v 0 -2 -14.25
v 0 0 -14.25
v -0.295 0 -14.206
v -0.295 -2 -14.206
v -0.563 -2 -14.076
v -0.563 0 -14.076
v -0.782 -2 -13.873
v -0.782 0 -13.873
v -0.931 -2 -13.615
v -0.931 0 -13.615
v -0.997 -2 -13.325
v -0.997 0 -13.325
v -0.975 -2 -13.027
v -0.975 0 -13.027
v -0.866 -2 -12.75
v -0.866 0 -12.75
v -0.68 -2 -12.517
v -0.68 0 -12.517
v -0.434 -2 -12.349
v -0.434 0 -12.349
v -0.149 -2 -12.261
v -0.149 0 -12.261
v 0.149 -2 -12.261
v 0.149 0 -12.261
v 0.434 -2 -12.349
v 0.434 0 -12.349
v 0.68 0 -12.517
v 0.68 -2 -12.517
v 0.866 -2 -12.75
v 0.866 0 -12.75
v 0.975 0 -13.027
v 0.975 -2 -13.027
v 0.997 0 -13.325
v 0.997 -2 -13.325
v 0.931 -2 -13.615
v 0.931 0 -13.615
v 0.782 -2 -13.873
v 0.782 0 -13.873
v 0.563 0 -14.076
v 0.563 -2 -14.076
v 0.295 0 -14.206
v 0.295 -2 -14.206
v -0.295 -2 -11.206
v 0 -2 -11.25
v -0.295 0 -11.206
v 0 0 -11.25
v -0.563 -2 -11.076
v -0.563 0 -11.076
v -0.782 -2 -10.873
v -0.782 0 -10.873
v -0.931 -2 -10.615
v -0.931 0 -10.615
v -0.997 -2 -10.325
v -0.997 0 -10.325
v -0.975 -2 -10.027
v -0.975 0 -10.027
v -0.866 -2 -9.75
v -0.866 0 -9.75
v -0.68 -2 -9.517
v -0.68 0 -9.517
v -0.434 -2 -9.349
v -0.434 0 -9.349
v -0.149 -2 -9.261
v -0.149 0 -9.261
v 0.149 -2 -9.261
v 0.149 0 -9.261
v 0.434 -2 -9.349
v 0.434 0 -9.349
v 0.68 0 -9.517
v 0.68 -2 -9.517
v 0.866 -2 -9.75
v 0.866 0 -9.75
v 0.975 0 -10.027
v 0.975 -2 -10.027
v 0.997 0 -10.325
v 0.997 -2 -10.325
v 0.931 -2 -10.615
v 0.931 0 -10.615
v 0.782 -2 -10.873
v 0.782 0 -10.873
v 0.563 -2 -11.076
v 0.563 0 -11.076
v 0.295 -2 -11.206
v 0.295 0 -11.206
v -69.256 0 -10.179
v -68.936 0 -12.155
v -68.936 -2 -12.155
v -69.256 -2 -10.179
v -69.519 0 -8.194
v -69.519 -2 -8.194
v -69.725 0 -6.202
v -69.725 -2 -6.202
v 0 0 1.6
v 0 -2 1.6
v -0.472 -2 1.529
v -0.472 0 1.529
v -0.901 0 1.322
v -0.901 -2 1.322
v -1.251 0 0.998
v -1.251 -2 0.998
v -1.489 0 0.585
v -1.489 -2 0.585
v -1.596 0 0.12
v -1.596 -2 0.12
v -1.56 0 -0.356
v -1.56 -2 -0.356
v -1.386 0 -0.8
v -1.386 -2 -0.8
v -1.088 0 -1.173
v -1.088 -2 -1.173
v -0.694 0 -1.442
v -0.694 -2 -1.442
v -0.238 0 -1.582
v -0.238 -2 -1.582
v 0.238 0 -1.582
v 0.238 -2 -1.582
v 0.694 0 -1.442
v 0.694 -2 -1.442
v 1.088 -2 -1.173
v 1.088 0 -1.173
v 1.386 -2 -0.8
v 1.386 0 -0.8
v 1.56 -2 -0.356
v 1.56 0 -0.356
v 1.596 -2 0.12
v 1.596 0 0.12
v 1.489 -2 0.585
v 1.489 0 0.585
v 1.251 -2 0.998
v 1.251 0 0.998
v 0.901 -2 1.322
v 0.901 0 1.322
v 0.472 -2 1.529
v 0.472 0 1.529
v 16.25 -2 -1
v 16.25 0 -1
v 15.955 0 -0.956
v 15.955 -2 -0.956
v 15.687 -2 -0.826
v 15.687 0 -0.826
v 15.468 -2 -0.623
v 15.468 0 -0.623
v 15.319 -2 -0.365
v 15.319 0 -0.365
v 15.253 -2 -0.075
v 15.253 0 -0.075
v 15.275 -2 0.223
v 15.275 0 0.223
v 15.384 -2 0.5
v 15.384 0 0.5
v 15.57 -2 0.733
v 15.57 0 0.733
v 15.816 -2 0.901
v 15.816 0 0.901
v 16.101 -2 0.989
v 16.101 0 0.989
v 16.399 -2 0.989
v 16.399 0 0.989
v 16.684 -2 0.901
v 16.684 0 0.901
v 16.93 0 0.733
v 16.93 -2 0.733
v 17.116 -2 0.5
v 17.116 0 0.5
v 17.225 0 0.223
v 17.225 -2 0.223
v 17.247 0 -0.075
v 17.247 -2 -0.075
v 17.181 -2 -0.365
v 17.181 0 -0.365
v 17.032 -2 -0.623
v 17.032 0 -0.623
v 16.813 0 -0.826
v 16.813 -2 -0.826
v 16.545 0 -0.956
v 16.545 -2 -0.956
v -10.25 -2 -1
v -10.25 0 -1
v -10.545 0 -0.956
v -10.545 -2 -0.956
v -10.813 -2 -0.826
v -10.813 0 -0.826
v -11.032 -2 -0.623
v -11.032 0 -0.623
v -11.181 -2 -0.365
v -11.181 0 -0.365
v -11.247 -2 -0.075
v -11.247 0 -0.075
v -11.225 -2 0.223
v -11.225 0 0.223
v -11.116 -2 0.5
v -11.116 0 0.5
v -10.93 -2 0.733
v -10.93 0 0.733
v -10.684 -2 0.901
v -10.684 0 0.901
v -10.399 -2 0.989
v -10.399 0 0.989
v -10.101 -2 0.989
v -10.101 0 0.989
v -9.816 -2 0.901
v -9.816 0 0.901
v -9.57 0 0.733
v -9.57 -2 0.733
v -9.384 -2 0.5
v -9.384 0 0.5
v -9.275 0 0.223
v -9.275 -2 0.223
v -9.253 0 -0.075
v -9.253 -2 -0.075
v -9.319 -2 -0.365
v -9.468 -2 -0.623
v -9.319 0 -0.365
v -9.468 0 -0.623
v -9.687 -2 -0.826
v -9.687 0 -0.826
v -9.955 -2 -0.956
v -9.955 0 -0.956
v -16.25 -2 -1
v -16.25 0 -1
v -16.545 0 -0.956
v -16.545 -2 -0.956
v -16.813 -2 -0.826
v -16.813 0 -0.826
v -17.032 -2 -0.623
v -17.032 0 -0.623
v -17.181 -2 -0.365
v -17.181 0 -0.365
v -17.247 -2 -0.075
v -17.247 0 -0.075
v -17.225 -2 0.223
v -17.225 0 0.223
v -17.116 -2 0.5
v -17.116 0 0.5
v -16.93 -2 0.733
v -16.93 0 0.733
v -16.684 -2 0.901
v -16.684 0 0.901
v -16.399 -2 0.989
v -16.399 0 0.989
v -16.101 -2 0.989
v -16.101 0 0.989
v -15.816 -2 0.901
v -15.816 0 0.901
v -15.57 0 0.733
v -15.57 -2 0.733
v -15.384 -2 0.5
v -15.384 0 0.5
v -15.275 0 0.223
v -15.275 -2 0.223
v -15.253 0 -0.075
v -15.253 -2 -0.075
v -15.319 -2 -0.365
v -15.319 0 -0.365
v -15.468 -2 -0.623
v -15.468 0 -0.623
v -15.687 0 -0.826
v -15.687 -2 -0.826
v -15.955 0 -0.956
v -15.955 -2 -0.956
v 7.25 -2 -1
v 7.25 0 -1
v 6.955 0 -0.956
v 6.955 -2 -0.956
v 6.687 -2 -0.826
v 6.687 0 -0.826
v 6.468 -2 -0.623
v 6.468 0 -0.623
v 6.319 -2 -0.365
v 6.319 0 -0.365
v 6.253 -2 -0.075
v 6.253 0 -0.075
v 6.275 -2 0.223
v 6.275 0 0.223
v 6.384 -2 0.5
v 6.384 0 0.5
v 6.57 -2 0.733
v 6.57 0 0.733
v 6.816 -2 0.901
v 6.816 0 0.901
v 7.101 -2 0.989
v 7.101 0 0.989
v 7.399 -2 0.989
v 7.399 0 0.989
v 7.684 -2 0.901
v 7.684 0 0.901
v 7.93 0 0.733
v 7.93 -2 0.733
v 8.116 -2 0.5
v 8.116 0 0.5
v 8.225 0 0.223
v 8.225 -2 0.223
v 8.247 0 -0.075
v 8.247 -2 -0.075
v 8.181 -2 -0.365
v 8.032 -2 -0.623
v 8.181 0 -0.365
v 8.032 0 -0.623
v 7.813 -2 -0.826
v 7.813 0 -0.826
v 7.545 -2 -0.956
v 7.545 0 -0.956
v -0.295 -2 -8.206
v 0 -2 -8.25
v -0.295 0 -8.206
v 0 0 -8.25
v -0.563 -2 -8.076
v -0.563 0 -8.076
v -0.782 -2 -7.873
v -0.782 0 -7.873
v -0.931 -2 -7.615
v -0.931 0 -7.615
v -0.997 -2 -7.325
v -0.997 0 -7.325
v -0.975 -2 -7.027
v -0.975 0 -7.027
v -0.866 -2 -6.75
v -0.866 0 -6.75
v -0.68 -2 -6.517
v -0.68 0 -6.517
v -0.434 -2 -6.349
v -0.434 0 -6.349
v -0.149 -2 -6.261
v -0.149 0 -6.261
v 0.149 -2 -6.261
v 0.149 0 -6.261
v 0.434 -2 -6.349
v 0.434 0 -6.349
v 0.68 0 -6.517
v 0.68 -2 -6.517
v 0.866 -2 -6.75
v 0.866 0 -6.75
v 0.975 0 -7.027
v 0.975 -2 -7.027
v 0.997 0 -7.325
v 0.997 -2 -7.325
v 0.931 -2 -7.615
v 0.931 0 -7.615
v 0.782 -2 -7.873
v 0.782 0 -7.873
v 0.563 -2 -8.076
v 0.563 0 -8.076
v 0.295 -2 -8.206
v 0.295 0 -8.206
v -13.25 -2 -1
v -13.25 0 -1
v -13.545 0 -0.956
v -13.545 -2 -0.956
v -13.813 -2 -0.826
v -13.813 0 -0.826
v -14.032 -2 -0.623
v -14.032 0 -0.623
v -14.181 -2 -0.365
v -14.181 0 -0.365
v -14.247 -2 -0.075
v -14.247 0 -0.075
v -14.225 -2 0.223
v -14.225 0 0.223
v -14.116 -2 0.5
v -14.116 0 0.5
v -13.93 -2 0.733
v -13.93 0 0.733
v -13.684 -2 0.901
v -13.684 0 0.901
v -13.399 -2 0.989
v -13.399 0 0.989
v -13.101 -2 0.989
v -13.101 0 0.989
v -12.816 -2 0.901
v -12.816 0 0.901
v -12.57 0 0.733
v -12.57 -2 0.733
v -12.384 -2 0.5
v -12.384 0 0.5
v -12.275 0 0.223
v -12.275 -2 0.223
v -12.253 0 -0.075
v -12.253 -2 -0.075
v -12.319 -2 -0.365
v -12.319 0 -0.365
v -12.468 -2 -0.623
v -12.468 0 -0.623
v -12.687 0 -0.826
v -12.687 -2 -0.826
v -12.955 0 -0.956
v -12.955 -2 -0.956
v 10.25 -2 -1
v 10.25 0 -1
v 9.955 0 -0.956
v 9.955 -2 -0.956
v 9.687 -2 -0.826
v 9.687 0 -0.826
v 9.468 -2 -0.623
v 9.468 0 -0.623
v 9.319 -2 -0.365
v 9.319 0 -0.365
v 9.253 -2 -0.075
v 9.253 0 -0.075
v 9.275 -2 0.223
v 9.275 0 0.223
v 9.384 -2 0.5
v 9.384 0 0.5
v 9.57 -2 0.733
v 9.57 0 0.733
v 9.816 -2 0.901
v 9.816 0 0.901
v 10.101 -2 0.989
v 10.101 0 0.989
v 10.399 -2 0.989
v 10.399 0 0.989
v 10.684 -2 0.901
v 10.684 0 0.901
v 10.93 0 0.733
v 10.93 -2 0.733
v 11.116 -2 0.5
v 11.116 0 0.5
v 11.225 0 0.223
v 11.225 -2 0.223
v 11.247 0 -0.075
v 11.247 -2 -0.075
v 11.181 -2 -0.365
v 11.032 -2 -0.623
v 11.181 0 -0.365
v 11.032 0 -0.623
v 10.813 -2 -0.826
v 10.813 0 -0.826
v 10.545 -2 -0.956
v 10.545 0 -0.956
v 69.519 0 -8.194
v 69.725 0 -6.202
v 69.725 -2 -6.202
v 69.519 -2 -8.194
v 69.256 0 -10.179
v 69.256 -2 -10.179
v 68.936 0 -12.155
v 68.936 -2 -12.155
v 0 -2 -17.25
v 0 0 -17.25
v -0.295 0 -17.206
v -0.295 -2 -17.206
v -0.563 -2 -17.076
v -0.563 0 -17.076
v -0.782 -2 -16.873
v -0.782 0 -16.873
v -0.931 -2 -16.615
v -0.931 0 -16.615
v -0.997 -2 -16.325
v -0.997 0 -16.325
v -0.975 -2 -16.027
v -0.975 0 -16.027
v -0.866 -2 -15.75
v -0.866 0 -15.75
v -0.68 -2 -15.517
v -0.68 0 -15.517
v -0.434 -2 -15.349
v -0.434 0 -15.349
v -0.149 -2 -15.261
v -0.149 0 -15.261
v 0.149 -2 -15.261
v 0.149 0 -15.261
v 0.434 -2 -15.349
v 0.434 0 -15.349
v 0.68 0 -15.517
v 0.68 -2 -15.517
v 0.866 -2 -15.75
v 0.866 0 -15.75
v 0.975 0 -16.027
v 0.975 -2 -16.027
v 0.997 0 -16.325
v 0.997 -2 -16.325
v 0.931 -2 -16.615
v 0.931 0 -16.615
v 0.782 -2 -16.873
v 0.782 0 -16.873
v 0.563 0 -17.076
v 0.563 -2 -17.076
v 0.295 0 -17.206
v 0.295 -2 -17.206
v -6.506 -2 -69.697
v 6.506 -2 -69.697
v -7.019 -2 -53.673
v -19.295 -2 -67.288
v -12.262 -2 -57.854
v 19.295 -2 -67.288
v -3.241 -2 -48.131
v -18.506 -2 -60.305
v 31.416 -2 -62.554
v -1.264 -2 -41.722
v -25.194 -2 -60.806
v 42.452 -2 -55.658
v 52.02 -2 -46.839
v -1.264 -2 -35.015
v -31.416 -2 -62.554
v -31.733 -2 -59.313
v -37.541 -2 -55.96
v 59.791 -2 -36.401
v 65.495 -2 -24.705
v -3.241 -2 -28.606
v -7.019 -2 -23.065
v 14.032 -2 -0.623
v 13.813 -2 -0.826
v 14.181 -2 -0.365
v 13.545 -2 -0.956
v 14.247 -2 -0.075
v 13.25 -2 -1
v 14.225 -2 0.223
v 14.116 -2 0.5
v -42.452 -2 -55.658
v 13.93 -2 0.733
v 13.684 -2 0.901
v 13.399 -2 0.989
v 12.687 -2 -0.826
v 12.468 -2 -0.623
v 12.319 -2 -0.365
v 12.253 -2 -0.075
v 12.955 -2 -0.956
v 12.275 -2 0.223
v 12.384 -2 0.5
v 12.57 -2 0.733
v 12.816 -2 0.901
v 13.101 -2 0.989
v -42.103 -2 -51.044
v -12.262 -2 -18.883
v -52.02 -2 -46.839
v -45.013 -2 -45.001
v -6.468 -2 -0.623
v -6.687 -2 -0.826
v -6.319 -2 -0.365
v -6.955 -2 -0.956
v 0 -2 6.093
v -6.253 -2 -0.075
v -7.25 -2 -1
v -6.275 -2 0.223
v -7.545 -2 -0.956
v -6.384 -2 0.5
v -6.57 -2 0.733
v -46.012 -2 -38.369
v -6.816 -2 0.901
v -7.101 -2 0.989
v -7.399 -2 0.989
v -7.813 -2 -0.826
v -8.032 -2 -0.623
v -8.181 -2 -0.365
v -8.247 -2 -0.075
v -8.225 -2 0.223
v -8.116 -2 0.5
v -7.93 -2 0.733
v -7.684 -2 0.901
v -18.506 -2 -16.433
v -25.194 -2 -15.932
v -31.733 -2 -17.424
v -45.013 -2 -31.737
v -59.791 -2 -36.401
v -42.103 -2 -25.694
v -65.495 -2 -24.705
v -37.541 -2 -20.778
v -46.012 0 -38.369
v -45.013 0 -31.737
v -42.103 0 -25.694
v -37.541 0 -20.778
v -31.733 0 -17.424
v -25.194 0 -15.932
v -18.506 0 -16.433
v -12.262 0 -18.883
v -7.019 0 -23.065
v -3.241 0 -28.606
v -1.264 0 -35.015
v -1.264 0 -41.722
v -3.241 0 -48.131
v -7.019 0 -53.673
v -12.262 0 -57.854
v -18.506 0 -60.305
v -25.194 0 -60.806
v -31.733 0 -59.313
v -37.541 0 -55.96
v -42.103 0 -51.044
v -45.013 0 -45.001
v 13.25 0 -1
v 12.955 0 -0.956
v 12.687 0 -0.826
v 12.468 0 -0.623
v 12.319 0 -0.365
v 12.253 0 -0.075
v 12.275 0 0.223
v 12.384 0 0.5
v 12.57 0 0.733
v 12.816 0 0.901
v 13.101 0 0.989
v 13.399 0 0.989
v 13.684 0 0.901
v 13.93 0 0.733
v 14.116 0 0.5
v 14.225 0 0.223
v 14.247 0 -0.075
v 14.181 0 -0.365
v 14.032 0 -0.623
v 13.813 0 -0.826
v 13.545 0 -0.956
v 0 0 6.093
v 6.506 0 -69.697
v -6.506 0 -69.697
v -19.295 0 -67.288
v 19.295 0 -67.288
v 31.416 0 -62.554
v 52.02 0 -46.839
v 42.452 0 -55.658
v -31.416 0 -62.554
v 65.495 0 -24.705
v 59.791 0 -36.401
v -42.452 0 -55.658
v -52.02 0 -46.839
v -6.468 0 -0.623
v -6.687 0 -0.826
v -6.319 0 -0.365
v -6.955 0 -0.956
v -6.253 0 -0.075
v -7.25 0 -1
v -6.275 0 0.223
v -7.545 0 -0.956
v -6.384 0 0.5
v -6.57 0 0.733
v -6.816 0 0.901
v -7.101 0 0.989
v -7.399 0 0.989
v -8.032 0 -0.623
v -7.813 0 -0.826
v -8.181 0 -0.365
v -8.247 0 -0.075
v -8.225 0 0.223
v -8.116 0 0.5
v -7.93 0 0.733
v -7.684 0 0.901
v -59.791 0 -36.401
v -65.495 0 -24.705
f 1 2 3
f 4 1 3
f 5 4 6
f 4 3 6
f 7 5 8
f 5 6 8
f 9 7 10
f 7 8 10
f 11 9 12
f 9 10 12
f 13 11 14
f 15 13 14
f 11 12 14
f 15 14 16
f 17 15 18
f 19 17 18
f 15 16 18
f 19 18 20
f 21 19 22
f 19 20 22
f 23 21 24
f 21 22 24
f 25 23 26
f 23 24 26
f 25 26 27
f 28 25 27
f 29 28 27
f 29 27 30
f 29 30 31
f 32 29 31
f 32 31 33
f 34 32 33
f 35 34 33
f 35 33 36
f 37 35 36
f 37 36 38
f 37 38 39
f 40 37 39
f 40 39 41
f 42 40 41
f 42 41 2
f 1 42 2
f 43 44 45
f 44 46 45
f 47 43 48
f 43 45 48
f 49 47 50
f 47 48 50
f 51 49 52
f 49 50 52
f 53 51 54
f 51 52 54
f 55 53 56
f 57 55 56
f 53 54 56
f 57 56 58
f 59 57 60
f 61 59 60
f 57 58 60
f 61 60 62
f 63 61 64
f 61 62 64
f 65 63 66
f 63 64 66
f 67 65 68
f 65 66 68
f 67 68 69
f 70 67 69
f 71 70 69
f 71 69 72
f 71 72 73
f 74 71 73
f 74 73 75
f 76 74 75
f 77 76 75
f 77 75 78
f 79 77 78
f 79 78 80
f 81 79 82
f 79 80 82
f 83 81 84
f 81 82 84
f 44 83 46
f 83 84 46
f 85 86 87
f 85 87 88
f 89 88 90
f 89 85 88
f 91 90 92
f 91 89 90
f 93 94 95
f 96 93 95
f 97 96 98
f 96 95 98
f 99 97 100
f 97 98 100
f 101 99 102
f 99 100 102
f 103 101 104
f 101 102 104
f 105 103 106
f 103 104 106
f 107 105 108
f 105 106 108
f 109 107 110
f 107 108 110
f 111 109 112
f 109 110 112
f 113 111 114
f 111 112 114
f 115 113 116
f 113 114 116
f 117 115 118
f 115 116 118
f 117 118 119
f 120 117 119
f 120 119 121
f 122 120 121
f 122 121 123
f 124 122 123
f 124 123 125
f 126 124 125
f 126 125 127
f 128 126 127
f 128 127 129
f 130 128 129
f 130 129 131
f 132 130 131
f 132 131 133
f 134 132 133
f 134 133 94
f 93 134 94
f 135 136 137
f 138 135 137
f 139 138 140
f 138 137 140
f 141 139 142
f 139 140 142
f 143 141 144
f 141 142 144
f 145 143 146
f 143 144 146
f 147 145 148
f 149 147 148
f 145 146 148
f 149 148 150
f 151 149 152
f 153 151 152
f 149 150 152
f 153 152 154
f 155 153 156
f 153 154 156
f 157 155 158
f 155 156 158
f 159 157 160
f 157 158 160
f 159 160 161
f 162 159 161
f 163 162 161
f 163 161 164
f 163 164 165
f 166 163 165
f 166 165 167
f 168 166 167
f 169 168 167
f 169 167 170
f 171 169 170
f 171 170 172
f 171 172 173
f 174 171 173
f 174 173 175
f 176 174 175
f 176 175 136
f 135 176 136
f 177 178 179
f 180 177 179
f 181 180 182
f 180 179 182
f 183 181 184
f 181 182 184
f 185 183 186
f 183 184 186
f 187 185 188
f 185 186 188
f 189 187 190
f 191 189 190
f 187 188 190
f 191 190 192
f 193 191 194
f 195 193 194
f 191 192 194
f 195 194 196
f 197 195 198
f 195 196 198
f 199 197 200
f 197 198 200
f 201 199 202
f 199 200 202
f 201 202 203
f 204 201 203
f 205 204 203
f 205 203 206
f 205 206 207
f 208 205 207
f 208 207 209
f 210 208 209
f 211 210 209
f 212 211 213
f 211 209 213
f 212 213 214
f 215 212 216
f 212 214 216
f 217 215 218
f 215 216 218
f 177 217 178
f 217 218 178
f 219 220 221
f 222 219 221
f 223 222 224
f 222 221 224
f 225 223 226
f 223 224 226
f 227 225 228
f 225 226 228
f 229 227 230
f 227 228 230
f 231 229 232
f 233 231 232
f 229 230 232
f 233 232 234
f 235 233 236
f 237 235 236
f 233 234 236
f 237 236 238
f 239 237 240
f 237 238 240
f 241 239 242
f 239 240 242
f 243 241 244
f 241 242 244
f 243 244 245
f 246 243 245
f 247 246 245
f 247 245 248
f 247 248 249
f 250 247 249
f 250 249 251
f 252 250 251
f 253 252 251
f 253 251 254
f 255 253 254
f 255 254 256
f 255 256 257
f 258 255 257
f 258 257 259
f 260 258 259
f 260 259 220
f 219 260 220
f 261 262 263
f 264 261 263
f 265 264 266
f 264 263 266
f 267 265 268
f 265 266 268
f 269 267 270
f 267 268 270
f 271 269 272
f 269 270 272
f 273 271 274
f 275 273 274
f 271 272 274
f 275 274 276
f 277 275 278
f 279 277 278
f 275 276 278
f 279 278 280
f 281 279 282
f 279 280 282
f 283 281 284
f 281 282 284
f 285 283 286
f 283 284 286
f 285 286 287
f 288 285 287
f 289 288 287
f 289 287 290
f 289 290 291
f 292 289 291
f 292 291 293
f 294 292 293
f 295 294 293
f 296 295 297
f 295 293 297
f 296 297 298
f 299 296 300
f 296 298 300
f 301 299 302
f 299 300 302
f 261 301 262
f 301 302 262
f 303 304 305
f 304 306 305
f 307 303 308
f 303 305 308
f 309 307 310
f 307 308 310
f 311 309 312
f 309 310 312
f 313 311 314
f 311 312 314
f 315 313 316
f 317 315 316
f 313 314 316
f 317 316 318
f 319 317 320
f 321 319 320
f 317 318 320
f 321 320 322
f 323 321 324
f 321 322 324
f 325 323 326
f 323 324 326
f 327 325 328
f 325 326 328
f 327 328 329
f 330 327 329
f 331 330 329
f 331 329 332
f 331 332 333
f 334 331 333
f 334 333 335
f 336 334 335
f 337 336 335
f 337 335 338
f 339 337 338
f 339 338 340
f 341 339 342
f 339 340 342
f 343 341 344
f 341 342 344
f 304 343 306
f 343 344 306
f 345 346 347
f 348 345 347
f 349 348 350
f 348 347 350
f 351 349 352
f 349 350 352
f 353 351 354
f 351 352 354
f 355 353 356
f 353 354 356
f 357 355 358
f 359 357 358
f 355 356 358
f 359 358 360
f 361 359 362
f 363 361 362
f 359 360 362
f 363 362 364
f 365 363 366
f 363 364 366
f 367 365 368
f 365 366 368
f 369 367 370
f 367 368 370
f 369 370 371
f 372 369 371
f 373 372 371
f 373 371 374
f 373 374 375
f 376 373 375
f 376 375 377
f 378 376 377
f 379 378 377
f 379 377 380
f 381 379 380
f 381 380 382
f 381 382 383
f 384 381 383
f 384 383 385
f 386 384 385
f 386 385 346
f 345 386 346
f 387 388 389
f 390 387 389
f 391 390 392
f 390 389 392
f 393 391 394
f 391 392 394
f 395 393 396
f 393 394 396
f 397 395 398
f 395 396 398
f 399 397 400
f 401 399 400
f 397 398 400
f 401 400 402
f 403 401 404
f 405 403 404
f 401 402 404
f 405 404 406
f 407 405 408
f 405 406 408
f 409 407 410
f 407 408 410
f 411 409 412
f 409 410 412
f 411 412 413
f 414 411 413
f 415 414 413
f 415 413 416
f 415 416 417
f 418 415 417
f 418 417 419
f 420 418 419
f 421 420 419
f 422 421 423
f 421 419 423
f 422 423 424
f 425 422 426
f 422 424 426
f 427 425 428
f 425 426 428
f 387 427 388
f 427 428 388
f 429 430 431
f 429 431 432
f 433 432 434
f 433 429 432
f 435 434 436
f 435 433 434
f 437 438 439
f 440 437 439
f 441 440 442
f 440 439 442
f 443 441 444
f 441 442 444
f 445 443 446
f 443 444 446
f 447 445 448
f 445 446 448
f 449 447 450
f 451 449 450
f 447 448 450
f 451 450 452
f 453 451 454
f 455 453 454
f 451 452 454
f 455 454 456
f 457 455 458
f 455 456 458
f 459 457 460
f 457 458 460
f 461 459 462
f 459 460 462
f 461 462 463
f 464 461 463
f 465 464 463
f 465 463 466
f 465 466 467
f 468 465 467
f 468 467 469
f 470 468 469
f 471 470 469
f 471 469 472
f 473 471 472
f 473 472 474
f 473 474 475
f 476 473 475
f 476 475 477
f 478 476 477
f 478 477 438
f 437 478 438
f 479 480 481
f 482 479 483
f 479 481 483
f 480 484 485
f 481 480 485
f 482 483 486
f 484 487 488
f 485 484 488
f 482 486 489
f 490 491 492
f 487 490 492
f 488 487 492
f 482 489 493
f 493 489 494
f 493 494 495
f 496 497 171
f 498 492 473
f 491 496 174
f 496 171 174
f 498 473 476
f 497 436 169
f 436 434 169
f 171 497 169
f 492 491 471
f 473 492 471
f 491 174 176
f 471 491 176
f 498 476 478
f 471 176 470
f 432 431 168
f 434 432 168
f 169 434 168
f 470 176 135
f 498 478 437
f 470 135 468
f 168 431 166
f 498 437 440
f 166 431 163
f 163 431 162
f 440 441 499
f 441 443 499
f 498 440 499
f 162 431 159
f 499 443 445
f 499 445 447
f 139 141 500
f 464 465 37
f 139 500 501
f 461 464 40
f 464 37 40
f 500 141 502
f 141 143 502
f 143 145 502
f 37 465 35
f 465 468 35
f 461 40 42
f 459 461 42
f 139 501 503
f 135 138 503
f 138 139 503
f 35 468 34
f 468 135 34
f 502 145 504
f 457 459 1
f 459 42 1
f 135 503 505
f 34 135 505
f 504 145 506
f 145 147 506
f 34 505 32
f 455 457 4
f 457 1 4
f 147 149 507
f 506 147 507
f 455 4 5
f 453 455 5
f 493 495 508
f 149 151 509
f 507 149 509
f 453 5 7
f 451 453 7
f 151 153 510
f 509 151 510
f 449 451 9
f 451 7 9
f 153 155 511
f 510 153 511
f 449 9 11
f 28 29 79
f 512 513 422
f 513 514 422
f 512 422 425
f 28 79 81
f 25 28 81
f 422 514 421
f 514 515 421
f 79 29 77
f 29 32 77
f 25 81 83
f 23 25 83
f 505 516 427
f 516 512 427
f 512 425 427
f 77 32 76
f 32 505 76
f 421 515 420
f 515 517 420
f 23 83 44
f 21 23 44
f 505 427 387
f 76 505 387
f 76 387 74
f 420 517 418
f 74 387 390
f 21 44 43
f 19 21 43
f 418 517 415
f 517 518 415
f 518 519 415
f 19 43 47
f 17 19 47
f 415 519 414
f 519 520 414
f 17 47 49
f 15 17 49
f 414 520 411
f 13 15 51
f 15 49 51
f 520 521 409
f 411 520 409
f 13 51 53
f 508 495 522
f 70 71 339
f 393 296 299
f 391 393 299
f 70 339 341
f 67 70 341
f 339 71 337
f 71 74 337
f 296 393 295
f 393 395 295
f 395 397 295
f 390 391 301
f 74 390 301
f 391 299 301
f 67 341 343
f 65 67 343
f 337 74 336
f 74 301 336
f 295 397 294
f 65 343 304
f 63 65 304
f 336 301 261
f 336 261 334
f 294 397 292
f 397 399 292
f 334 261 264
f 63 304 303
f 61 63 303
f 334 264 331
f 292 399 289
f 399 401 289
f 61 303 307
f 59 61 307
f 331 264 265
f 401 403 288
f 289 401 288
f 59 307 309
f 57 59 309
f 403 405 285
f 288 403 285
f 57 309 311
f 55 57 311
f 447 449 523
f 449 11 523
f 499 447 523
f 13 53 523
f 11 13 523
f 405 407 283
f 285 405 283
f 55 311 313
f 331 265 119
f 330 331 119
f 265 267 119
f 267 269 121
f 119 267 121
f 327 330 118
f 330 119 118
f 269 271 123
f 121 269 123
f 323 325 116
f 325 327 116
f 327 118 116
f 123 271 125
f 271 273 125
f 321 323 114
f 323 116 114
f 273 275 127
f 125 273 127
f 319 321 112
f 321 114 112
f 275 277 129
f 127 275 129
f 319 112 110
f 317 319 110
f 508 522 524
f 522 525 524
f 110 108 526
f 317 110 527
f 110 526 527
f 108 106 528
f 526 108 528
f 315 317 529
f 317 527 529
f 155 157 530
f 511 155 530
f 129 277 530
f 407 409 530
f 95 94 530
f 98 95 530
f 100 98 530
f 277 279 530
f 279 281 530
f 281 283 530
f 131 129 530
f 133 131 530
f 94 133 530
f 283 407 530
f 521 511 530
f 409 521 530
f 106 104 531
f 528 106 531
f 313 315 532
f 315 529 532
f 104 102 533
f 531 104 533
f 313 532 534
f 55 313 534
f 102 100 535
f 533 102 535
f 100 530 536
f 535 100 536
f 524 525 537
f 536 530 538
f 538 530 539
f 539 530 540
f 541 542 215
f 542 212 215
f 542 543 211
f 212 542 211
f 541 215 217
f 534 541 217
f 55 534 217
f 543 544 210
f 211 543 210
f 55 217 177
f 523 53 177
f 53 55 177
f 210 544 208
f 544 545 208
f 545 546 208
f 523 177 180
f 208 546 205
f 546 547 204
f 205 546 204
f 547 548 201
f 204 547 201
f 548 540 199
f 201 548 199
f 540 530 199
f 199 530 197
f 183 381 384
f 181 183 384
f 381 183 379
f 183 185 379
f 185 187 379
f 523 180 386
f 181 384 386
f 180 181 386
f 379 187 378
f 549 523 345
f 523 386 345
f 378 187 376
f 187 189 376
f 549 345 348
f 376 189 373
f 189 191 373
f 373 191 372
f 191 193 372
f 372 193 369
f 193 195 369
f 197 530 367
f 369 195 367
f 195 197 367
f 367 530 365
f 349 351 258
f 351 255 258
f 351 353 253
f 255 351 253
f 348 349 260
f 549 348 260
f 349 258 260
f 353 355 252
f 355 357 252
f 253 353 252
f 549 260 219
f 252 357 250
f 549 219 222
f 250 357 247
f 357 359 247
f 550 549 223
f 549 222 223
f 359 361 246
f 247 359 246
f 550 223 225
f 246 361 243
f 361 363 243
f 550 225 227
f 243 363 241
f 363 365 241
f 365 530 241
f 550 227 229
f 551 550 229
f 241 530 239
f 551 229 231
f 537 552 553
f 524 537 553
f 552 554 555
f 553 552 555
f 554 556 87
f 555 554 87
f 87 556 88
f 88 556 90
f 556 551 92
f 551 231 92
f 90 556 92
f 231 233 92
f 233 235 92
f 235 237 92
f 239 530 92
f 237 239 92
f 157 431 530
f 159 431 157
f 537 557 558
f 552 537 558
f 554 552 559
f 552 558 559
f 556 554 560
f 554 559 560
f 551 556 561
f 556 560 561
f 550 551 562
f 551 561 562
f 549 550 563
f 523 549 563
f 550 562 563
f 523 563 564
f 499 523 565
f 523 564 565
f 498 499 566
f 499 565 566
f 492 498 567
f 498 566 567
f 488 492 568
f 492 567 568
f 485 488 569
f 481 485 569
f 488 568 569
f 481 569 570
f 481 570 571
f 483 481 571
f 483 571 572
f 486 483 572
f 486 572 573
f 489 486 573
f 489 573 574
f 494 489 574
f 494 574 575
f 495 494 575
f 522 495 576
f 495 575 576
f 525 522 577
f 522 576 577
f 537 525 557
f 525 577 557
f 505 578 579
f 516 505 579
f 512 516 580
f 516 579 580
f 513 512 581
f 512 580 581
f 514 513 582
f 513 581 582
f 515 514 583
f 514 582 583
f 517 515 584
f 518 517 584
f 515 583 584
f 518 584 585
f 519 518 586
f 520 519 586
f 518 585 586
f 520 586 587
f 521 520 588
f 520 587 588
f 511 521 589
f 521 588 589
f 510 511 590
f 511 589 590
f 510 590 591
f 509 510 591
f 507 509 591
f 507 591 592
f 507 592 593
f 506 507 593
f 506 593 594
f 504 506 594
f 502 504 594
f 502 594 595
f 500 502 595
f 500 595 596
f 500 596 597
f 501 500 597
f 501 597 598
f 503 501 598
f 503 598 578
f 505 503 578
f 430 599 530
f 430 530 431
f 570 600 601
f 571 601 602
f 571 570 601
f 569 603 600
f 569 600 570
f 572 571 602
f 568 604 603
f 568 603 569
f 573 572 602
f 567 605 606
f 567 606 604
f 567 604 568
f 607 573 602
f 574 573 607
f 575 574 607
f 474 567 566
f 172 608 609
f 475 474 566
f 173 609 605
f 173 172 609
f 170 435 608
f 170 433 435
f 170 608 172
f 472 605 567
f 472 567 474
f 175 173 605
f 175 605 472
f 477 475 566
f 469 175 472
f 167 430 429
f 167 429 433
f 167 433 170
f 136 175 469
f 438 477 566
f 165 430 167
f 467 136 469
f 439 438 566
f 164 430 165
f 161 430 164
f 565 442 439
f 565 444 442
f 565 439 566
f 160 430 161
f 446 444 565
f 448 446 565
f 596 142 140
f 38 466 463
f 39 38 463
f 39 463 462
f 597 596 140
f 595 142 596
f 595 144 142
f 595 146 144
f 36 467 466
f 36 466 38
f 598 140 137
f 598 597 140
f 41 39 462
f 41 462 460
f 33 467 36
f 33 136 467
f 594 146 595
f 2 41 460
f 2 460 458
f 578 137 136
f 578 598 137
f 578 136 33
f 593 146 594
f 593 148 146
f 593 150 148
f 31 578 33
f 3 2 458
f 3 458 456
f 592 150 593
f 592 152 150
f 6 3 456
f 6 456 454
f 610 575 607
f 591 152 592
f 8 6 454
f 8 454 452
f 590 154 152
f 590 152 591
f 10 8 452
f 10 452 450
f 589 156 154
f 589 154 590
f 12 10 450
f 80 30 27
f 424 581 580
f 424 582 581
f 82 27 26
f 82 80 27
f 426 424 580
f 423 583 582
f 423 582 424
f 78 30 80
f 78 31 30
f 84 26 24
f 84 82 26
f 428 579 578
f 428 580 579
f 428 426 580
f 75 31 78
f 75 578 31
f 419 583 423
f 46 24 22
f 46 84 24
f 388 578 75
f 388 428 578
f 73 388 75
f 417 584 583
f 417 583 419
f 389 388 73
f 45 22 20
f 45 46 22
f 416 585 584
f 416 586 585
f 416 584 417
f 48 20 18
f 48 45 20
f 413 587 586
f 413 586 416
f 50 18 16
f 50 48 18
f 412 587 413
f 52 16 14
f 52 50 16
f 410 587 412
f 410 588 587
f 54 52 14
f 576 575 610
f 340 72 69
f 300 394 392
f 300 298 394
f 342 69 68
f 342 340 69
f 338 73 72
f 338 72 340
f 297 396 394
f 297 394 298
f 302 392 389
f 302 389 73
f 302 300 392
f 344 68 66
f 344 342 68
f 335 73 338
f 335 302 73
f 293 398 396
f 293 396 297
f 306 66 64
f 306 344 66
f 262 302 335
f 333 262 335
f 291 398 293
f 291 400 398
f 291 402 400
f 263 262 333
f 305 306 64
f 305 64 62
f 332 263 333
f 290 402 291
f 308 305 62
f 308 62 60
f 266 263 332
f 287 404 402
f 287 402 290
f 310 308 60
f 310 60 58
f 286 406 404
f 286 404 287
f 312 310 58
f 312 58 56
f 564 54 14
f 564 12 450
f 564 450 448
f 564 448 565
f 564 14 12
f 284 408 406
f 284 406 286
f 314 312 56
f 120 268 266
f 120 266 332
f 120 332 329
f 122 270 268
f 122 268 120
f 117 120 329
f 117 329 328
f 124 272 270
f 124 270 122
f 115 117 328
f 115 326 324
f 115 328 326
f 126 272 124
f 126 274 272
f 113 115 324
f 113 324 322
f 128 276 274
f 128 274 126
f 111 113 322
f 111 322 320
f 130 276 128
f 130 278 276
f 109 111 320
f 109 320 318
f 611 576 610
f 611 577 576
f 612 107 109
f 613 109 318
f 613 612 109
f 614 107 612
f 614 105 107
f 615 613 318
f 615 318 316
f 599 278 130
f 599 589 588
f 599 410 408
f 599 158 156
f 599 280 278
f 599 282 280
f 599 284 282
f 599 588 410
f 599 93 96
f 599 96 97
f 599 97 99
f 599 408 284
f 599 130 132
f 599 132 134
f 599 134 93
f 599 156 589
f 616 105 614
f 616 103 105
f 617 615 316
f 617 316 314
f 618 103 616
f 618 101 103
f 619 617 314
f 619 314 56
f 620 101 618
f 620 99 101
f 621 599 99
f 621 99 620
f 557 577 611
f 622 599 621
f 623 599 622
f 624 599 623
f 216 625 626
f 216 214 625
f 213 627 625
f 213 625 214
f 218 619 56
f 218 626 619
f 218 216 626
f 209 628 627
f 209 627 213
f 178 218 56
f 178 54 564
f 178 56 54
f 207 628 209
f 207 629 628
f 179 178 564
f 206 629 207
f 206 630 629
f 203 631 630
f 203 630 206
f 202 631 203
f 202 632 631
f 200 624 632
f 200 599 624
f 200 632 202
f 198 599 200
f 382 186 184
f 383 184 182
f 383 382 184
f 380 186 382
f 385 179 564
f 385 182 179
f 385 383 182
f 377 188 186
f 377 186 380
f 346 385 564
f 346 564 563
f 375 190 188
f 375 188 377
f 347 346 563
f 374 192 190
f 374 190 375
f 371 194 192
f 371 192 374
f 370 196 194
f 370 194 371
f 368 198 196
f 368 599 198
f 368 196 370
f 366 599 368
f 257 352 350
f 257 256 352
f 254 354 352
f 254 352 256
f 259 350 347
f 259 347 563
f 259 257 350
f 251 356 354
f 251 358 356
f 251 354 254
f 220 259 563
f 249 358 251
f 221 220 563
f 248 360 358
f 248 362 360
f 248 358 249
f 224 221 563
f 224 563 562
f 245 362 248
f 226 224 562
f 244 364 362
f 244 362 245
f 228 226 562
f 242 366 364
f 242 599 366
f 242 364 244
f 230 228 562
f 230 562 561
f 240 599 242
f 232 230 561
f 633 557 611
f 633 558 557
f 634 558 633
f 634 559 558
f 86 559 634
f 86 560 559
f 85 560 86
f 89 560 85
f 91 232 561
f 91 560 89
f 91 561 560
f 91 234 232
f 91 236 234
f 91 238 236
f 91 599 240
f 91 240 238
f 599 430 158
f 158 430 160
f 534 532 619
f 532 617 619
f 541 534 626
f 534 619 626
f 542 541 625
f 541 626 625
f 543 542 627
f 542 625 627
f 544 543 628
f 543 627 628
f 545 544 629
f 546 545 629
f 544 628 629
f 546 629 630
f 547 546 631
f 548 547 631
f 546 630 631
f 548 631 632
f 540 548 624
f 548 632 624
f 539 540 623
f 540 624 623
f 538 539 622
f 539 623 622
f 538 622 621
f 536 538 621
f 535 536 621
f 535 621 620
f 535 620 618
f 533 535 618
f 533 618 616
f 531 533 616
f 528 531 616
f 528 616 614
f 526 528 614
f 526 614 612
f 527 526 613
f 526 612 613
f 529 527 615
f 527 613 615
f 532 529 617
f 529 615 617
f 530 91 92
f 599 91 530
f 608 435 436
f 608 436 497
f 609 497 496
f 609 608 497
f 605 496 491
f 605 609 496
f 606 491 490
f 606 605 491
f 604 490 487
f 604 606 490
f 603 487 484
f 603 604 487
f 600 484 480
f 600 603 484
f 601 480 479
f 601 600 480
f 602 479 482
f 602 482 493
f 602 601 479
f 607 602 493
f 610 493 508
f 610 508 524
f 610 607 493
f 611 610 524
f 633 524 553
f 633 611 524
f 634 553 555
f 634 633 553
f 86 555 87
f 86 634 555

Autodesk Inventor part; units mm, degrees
ref_plane "YZ Plane" through (0, 0, 0) normal (1, 0, 0) x (0, 1, 0)
ref_plane "XZ Plane" through (0, 0, 0) normal (0, 1, 0) x (-1, 0, 0)
ref_plane "XY Plane" through (0, 0, 0) normal (0, 0, 1) x (1, 0, 0)
sketch "草圖1" plane through (0, 0, 0) normal (0, 1, 0) x (-1, 0, 0)
  line L0 (0, 0) -> (5.9088, -1.0419) construction
  line L1 (0, 0) -> (-5.9088, -1.0419) construction
  arc A0 (5.9088, -1.0419) -> (-5.9088, -1.0419) centre (0, 0) ccw
  arc A1 (-68.9365, -12.1554) -> (68.9365, -12.1554) centre (0, 0) ccw
  line L2 (5.9088, -1.0419) -> (68.9365, -12.1554)
  line L3 (-5.9088, -1.0419) -> (-68.9365, -12.1554)
  circle A2 centre (23.5124, -38.3688) radius 22.5
  circle A3 centre (-23.5124, -38.3688) radius 22.5 construction
  arc A4 (-23.5124, -38.3688) -> (23.5124, -38.3688) centre (0, 0) ccw construction
  line L4 (23.5124, -38.3688) -> (0, 0) construction
  line L5 (-23.5124, -38.3688) -> (0, 0) construction
  line L6 (0, -85.2185) -> (0, 21.3111) construction
  line L7 (69.7247, -6.2018) -> (0, 6.0926)
  line L8 (0, 6.0926) -> (-69.7247, -6.2018)
  arc A5 (68.9365, -12.1554) -> (69.7247, -6.2018) centre (0, 0) ccw
  arc A6 (-69.7247, -6.2018) -> (-68.9365, -12.1554) centre (0, 0) ccw
  dimension "d0" = 12
  dimension "d1" = 45
  dimension "d3" = 45
  dimension "d5" = 160
  dimension "d6" = 63
  dimension "d7" = 70
extrude "擠出1" add sketch "草圖1" against normal blind 2
hole "孔1" at (0, 0, 0) direction (0, -1, 0) diameter 3.2 end through all
sketch "草圖2" plane through (0, 0, 0) normal (0, 1, 0) x (-1, 0, 0)
  arc A0 (-23.5124, -38.3688) -> (23.5124, -38.3688) centre (0, 0) ccw construction
  circle A1 centre (0, 0) radius 1.6 projected
  circle A2 centre (0, 0) radius 45
feature "擠出表面1" [suppressed]
sketch "草圖3" plane through (0, -2, 0) normal (0, -1, 0) x (1, 0, 0)
  circle A0 centre (0, -13.25) radius 0.75
  circle A1 centre (0, -16.25) radius 0.75
  circle A2 centre (0, -10.25) radius 0.75
  circle A3 centre (0, -7.25) radius 0.75
  line L0 (0, 0) -> (0, -16.25) construction
  circle A4 centre (0, 0) radius 1.6 construction
  circle A5 centre (13.25, 0) radius 0.75
  circle A6 centre (16.25, 0) radius 0.75
  circle A7 centre (10.25, 0) radius 0.75
  circle A8 centre (7.25, 0) radius 0.75
  circle A9 centre (0, 13.25) radius 0.75
  circle A10 centre (0, 16.25) radius 0.75
  circle A11 centre (0, 10.25) radius 0.75
  circle A12 centre (0, 7.25) radius 0.75
  circle A13 centre (-13.25, 0) radius 0.75
  circle A14 centre (-16.25, 0) radius 0.75
  circle A15 centre (-10.25, 0) radius 0.75
  circle A16 centre (-7.25, 0) radius 0.75
  dimension "d21" = 3
  dimension "d22" = 3
  dimension "d24" = 1.5
  dimension "d25" = 3
  dimension "d26" = 7.25
  dimension "d29" = 360
hole "孔2" at (-7.25, -2, 0) at (-10.25, -2, 0) at (-13.25, -2, 0) at (-16.25, -2, 0) at (0, -2, -13.25) at (0, -2, -16.25) at (0, -2, -7.25) at (0, -2, -10.25) at (7.25, -2, 0) at (10.25, -2, 0) at (13.25, -2, 0) at (16.25, -2, 0) direction (0, 1, 0) diameter 2 end through all
properties part number "A0002"
